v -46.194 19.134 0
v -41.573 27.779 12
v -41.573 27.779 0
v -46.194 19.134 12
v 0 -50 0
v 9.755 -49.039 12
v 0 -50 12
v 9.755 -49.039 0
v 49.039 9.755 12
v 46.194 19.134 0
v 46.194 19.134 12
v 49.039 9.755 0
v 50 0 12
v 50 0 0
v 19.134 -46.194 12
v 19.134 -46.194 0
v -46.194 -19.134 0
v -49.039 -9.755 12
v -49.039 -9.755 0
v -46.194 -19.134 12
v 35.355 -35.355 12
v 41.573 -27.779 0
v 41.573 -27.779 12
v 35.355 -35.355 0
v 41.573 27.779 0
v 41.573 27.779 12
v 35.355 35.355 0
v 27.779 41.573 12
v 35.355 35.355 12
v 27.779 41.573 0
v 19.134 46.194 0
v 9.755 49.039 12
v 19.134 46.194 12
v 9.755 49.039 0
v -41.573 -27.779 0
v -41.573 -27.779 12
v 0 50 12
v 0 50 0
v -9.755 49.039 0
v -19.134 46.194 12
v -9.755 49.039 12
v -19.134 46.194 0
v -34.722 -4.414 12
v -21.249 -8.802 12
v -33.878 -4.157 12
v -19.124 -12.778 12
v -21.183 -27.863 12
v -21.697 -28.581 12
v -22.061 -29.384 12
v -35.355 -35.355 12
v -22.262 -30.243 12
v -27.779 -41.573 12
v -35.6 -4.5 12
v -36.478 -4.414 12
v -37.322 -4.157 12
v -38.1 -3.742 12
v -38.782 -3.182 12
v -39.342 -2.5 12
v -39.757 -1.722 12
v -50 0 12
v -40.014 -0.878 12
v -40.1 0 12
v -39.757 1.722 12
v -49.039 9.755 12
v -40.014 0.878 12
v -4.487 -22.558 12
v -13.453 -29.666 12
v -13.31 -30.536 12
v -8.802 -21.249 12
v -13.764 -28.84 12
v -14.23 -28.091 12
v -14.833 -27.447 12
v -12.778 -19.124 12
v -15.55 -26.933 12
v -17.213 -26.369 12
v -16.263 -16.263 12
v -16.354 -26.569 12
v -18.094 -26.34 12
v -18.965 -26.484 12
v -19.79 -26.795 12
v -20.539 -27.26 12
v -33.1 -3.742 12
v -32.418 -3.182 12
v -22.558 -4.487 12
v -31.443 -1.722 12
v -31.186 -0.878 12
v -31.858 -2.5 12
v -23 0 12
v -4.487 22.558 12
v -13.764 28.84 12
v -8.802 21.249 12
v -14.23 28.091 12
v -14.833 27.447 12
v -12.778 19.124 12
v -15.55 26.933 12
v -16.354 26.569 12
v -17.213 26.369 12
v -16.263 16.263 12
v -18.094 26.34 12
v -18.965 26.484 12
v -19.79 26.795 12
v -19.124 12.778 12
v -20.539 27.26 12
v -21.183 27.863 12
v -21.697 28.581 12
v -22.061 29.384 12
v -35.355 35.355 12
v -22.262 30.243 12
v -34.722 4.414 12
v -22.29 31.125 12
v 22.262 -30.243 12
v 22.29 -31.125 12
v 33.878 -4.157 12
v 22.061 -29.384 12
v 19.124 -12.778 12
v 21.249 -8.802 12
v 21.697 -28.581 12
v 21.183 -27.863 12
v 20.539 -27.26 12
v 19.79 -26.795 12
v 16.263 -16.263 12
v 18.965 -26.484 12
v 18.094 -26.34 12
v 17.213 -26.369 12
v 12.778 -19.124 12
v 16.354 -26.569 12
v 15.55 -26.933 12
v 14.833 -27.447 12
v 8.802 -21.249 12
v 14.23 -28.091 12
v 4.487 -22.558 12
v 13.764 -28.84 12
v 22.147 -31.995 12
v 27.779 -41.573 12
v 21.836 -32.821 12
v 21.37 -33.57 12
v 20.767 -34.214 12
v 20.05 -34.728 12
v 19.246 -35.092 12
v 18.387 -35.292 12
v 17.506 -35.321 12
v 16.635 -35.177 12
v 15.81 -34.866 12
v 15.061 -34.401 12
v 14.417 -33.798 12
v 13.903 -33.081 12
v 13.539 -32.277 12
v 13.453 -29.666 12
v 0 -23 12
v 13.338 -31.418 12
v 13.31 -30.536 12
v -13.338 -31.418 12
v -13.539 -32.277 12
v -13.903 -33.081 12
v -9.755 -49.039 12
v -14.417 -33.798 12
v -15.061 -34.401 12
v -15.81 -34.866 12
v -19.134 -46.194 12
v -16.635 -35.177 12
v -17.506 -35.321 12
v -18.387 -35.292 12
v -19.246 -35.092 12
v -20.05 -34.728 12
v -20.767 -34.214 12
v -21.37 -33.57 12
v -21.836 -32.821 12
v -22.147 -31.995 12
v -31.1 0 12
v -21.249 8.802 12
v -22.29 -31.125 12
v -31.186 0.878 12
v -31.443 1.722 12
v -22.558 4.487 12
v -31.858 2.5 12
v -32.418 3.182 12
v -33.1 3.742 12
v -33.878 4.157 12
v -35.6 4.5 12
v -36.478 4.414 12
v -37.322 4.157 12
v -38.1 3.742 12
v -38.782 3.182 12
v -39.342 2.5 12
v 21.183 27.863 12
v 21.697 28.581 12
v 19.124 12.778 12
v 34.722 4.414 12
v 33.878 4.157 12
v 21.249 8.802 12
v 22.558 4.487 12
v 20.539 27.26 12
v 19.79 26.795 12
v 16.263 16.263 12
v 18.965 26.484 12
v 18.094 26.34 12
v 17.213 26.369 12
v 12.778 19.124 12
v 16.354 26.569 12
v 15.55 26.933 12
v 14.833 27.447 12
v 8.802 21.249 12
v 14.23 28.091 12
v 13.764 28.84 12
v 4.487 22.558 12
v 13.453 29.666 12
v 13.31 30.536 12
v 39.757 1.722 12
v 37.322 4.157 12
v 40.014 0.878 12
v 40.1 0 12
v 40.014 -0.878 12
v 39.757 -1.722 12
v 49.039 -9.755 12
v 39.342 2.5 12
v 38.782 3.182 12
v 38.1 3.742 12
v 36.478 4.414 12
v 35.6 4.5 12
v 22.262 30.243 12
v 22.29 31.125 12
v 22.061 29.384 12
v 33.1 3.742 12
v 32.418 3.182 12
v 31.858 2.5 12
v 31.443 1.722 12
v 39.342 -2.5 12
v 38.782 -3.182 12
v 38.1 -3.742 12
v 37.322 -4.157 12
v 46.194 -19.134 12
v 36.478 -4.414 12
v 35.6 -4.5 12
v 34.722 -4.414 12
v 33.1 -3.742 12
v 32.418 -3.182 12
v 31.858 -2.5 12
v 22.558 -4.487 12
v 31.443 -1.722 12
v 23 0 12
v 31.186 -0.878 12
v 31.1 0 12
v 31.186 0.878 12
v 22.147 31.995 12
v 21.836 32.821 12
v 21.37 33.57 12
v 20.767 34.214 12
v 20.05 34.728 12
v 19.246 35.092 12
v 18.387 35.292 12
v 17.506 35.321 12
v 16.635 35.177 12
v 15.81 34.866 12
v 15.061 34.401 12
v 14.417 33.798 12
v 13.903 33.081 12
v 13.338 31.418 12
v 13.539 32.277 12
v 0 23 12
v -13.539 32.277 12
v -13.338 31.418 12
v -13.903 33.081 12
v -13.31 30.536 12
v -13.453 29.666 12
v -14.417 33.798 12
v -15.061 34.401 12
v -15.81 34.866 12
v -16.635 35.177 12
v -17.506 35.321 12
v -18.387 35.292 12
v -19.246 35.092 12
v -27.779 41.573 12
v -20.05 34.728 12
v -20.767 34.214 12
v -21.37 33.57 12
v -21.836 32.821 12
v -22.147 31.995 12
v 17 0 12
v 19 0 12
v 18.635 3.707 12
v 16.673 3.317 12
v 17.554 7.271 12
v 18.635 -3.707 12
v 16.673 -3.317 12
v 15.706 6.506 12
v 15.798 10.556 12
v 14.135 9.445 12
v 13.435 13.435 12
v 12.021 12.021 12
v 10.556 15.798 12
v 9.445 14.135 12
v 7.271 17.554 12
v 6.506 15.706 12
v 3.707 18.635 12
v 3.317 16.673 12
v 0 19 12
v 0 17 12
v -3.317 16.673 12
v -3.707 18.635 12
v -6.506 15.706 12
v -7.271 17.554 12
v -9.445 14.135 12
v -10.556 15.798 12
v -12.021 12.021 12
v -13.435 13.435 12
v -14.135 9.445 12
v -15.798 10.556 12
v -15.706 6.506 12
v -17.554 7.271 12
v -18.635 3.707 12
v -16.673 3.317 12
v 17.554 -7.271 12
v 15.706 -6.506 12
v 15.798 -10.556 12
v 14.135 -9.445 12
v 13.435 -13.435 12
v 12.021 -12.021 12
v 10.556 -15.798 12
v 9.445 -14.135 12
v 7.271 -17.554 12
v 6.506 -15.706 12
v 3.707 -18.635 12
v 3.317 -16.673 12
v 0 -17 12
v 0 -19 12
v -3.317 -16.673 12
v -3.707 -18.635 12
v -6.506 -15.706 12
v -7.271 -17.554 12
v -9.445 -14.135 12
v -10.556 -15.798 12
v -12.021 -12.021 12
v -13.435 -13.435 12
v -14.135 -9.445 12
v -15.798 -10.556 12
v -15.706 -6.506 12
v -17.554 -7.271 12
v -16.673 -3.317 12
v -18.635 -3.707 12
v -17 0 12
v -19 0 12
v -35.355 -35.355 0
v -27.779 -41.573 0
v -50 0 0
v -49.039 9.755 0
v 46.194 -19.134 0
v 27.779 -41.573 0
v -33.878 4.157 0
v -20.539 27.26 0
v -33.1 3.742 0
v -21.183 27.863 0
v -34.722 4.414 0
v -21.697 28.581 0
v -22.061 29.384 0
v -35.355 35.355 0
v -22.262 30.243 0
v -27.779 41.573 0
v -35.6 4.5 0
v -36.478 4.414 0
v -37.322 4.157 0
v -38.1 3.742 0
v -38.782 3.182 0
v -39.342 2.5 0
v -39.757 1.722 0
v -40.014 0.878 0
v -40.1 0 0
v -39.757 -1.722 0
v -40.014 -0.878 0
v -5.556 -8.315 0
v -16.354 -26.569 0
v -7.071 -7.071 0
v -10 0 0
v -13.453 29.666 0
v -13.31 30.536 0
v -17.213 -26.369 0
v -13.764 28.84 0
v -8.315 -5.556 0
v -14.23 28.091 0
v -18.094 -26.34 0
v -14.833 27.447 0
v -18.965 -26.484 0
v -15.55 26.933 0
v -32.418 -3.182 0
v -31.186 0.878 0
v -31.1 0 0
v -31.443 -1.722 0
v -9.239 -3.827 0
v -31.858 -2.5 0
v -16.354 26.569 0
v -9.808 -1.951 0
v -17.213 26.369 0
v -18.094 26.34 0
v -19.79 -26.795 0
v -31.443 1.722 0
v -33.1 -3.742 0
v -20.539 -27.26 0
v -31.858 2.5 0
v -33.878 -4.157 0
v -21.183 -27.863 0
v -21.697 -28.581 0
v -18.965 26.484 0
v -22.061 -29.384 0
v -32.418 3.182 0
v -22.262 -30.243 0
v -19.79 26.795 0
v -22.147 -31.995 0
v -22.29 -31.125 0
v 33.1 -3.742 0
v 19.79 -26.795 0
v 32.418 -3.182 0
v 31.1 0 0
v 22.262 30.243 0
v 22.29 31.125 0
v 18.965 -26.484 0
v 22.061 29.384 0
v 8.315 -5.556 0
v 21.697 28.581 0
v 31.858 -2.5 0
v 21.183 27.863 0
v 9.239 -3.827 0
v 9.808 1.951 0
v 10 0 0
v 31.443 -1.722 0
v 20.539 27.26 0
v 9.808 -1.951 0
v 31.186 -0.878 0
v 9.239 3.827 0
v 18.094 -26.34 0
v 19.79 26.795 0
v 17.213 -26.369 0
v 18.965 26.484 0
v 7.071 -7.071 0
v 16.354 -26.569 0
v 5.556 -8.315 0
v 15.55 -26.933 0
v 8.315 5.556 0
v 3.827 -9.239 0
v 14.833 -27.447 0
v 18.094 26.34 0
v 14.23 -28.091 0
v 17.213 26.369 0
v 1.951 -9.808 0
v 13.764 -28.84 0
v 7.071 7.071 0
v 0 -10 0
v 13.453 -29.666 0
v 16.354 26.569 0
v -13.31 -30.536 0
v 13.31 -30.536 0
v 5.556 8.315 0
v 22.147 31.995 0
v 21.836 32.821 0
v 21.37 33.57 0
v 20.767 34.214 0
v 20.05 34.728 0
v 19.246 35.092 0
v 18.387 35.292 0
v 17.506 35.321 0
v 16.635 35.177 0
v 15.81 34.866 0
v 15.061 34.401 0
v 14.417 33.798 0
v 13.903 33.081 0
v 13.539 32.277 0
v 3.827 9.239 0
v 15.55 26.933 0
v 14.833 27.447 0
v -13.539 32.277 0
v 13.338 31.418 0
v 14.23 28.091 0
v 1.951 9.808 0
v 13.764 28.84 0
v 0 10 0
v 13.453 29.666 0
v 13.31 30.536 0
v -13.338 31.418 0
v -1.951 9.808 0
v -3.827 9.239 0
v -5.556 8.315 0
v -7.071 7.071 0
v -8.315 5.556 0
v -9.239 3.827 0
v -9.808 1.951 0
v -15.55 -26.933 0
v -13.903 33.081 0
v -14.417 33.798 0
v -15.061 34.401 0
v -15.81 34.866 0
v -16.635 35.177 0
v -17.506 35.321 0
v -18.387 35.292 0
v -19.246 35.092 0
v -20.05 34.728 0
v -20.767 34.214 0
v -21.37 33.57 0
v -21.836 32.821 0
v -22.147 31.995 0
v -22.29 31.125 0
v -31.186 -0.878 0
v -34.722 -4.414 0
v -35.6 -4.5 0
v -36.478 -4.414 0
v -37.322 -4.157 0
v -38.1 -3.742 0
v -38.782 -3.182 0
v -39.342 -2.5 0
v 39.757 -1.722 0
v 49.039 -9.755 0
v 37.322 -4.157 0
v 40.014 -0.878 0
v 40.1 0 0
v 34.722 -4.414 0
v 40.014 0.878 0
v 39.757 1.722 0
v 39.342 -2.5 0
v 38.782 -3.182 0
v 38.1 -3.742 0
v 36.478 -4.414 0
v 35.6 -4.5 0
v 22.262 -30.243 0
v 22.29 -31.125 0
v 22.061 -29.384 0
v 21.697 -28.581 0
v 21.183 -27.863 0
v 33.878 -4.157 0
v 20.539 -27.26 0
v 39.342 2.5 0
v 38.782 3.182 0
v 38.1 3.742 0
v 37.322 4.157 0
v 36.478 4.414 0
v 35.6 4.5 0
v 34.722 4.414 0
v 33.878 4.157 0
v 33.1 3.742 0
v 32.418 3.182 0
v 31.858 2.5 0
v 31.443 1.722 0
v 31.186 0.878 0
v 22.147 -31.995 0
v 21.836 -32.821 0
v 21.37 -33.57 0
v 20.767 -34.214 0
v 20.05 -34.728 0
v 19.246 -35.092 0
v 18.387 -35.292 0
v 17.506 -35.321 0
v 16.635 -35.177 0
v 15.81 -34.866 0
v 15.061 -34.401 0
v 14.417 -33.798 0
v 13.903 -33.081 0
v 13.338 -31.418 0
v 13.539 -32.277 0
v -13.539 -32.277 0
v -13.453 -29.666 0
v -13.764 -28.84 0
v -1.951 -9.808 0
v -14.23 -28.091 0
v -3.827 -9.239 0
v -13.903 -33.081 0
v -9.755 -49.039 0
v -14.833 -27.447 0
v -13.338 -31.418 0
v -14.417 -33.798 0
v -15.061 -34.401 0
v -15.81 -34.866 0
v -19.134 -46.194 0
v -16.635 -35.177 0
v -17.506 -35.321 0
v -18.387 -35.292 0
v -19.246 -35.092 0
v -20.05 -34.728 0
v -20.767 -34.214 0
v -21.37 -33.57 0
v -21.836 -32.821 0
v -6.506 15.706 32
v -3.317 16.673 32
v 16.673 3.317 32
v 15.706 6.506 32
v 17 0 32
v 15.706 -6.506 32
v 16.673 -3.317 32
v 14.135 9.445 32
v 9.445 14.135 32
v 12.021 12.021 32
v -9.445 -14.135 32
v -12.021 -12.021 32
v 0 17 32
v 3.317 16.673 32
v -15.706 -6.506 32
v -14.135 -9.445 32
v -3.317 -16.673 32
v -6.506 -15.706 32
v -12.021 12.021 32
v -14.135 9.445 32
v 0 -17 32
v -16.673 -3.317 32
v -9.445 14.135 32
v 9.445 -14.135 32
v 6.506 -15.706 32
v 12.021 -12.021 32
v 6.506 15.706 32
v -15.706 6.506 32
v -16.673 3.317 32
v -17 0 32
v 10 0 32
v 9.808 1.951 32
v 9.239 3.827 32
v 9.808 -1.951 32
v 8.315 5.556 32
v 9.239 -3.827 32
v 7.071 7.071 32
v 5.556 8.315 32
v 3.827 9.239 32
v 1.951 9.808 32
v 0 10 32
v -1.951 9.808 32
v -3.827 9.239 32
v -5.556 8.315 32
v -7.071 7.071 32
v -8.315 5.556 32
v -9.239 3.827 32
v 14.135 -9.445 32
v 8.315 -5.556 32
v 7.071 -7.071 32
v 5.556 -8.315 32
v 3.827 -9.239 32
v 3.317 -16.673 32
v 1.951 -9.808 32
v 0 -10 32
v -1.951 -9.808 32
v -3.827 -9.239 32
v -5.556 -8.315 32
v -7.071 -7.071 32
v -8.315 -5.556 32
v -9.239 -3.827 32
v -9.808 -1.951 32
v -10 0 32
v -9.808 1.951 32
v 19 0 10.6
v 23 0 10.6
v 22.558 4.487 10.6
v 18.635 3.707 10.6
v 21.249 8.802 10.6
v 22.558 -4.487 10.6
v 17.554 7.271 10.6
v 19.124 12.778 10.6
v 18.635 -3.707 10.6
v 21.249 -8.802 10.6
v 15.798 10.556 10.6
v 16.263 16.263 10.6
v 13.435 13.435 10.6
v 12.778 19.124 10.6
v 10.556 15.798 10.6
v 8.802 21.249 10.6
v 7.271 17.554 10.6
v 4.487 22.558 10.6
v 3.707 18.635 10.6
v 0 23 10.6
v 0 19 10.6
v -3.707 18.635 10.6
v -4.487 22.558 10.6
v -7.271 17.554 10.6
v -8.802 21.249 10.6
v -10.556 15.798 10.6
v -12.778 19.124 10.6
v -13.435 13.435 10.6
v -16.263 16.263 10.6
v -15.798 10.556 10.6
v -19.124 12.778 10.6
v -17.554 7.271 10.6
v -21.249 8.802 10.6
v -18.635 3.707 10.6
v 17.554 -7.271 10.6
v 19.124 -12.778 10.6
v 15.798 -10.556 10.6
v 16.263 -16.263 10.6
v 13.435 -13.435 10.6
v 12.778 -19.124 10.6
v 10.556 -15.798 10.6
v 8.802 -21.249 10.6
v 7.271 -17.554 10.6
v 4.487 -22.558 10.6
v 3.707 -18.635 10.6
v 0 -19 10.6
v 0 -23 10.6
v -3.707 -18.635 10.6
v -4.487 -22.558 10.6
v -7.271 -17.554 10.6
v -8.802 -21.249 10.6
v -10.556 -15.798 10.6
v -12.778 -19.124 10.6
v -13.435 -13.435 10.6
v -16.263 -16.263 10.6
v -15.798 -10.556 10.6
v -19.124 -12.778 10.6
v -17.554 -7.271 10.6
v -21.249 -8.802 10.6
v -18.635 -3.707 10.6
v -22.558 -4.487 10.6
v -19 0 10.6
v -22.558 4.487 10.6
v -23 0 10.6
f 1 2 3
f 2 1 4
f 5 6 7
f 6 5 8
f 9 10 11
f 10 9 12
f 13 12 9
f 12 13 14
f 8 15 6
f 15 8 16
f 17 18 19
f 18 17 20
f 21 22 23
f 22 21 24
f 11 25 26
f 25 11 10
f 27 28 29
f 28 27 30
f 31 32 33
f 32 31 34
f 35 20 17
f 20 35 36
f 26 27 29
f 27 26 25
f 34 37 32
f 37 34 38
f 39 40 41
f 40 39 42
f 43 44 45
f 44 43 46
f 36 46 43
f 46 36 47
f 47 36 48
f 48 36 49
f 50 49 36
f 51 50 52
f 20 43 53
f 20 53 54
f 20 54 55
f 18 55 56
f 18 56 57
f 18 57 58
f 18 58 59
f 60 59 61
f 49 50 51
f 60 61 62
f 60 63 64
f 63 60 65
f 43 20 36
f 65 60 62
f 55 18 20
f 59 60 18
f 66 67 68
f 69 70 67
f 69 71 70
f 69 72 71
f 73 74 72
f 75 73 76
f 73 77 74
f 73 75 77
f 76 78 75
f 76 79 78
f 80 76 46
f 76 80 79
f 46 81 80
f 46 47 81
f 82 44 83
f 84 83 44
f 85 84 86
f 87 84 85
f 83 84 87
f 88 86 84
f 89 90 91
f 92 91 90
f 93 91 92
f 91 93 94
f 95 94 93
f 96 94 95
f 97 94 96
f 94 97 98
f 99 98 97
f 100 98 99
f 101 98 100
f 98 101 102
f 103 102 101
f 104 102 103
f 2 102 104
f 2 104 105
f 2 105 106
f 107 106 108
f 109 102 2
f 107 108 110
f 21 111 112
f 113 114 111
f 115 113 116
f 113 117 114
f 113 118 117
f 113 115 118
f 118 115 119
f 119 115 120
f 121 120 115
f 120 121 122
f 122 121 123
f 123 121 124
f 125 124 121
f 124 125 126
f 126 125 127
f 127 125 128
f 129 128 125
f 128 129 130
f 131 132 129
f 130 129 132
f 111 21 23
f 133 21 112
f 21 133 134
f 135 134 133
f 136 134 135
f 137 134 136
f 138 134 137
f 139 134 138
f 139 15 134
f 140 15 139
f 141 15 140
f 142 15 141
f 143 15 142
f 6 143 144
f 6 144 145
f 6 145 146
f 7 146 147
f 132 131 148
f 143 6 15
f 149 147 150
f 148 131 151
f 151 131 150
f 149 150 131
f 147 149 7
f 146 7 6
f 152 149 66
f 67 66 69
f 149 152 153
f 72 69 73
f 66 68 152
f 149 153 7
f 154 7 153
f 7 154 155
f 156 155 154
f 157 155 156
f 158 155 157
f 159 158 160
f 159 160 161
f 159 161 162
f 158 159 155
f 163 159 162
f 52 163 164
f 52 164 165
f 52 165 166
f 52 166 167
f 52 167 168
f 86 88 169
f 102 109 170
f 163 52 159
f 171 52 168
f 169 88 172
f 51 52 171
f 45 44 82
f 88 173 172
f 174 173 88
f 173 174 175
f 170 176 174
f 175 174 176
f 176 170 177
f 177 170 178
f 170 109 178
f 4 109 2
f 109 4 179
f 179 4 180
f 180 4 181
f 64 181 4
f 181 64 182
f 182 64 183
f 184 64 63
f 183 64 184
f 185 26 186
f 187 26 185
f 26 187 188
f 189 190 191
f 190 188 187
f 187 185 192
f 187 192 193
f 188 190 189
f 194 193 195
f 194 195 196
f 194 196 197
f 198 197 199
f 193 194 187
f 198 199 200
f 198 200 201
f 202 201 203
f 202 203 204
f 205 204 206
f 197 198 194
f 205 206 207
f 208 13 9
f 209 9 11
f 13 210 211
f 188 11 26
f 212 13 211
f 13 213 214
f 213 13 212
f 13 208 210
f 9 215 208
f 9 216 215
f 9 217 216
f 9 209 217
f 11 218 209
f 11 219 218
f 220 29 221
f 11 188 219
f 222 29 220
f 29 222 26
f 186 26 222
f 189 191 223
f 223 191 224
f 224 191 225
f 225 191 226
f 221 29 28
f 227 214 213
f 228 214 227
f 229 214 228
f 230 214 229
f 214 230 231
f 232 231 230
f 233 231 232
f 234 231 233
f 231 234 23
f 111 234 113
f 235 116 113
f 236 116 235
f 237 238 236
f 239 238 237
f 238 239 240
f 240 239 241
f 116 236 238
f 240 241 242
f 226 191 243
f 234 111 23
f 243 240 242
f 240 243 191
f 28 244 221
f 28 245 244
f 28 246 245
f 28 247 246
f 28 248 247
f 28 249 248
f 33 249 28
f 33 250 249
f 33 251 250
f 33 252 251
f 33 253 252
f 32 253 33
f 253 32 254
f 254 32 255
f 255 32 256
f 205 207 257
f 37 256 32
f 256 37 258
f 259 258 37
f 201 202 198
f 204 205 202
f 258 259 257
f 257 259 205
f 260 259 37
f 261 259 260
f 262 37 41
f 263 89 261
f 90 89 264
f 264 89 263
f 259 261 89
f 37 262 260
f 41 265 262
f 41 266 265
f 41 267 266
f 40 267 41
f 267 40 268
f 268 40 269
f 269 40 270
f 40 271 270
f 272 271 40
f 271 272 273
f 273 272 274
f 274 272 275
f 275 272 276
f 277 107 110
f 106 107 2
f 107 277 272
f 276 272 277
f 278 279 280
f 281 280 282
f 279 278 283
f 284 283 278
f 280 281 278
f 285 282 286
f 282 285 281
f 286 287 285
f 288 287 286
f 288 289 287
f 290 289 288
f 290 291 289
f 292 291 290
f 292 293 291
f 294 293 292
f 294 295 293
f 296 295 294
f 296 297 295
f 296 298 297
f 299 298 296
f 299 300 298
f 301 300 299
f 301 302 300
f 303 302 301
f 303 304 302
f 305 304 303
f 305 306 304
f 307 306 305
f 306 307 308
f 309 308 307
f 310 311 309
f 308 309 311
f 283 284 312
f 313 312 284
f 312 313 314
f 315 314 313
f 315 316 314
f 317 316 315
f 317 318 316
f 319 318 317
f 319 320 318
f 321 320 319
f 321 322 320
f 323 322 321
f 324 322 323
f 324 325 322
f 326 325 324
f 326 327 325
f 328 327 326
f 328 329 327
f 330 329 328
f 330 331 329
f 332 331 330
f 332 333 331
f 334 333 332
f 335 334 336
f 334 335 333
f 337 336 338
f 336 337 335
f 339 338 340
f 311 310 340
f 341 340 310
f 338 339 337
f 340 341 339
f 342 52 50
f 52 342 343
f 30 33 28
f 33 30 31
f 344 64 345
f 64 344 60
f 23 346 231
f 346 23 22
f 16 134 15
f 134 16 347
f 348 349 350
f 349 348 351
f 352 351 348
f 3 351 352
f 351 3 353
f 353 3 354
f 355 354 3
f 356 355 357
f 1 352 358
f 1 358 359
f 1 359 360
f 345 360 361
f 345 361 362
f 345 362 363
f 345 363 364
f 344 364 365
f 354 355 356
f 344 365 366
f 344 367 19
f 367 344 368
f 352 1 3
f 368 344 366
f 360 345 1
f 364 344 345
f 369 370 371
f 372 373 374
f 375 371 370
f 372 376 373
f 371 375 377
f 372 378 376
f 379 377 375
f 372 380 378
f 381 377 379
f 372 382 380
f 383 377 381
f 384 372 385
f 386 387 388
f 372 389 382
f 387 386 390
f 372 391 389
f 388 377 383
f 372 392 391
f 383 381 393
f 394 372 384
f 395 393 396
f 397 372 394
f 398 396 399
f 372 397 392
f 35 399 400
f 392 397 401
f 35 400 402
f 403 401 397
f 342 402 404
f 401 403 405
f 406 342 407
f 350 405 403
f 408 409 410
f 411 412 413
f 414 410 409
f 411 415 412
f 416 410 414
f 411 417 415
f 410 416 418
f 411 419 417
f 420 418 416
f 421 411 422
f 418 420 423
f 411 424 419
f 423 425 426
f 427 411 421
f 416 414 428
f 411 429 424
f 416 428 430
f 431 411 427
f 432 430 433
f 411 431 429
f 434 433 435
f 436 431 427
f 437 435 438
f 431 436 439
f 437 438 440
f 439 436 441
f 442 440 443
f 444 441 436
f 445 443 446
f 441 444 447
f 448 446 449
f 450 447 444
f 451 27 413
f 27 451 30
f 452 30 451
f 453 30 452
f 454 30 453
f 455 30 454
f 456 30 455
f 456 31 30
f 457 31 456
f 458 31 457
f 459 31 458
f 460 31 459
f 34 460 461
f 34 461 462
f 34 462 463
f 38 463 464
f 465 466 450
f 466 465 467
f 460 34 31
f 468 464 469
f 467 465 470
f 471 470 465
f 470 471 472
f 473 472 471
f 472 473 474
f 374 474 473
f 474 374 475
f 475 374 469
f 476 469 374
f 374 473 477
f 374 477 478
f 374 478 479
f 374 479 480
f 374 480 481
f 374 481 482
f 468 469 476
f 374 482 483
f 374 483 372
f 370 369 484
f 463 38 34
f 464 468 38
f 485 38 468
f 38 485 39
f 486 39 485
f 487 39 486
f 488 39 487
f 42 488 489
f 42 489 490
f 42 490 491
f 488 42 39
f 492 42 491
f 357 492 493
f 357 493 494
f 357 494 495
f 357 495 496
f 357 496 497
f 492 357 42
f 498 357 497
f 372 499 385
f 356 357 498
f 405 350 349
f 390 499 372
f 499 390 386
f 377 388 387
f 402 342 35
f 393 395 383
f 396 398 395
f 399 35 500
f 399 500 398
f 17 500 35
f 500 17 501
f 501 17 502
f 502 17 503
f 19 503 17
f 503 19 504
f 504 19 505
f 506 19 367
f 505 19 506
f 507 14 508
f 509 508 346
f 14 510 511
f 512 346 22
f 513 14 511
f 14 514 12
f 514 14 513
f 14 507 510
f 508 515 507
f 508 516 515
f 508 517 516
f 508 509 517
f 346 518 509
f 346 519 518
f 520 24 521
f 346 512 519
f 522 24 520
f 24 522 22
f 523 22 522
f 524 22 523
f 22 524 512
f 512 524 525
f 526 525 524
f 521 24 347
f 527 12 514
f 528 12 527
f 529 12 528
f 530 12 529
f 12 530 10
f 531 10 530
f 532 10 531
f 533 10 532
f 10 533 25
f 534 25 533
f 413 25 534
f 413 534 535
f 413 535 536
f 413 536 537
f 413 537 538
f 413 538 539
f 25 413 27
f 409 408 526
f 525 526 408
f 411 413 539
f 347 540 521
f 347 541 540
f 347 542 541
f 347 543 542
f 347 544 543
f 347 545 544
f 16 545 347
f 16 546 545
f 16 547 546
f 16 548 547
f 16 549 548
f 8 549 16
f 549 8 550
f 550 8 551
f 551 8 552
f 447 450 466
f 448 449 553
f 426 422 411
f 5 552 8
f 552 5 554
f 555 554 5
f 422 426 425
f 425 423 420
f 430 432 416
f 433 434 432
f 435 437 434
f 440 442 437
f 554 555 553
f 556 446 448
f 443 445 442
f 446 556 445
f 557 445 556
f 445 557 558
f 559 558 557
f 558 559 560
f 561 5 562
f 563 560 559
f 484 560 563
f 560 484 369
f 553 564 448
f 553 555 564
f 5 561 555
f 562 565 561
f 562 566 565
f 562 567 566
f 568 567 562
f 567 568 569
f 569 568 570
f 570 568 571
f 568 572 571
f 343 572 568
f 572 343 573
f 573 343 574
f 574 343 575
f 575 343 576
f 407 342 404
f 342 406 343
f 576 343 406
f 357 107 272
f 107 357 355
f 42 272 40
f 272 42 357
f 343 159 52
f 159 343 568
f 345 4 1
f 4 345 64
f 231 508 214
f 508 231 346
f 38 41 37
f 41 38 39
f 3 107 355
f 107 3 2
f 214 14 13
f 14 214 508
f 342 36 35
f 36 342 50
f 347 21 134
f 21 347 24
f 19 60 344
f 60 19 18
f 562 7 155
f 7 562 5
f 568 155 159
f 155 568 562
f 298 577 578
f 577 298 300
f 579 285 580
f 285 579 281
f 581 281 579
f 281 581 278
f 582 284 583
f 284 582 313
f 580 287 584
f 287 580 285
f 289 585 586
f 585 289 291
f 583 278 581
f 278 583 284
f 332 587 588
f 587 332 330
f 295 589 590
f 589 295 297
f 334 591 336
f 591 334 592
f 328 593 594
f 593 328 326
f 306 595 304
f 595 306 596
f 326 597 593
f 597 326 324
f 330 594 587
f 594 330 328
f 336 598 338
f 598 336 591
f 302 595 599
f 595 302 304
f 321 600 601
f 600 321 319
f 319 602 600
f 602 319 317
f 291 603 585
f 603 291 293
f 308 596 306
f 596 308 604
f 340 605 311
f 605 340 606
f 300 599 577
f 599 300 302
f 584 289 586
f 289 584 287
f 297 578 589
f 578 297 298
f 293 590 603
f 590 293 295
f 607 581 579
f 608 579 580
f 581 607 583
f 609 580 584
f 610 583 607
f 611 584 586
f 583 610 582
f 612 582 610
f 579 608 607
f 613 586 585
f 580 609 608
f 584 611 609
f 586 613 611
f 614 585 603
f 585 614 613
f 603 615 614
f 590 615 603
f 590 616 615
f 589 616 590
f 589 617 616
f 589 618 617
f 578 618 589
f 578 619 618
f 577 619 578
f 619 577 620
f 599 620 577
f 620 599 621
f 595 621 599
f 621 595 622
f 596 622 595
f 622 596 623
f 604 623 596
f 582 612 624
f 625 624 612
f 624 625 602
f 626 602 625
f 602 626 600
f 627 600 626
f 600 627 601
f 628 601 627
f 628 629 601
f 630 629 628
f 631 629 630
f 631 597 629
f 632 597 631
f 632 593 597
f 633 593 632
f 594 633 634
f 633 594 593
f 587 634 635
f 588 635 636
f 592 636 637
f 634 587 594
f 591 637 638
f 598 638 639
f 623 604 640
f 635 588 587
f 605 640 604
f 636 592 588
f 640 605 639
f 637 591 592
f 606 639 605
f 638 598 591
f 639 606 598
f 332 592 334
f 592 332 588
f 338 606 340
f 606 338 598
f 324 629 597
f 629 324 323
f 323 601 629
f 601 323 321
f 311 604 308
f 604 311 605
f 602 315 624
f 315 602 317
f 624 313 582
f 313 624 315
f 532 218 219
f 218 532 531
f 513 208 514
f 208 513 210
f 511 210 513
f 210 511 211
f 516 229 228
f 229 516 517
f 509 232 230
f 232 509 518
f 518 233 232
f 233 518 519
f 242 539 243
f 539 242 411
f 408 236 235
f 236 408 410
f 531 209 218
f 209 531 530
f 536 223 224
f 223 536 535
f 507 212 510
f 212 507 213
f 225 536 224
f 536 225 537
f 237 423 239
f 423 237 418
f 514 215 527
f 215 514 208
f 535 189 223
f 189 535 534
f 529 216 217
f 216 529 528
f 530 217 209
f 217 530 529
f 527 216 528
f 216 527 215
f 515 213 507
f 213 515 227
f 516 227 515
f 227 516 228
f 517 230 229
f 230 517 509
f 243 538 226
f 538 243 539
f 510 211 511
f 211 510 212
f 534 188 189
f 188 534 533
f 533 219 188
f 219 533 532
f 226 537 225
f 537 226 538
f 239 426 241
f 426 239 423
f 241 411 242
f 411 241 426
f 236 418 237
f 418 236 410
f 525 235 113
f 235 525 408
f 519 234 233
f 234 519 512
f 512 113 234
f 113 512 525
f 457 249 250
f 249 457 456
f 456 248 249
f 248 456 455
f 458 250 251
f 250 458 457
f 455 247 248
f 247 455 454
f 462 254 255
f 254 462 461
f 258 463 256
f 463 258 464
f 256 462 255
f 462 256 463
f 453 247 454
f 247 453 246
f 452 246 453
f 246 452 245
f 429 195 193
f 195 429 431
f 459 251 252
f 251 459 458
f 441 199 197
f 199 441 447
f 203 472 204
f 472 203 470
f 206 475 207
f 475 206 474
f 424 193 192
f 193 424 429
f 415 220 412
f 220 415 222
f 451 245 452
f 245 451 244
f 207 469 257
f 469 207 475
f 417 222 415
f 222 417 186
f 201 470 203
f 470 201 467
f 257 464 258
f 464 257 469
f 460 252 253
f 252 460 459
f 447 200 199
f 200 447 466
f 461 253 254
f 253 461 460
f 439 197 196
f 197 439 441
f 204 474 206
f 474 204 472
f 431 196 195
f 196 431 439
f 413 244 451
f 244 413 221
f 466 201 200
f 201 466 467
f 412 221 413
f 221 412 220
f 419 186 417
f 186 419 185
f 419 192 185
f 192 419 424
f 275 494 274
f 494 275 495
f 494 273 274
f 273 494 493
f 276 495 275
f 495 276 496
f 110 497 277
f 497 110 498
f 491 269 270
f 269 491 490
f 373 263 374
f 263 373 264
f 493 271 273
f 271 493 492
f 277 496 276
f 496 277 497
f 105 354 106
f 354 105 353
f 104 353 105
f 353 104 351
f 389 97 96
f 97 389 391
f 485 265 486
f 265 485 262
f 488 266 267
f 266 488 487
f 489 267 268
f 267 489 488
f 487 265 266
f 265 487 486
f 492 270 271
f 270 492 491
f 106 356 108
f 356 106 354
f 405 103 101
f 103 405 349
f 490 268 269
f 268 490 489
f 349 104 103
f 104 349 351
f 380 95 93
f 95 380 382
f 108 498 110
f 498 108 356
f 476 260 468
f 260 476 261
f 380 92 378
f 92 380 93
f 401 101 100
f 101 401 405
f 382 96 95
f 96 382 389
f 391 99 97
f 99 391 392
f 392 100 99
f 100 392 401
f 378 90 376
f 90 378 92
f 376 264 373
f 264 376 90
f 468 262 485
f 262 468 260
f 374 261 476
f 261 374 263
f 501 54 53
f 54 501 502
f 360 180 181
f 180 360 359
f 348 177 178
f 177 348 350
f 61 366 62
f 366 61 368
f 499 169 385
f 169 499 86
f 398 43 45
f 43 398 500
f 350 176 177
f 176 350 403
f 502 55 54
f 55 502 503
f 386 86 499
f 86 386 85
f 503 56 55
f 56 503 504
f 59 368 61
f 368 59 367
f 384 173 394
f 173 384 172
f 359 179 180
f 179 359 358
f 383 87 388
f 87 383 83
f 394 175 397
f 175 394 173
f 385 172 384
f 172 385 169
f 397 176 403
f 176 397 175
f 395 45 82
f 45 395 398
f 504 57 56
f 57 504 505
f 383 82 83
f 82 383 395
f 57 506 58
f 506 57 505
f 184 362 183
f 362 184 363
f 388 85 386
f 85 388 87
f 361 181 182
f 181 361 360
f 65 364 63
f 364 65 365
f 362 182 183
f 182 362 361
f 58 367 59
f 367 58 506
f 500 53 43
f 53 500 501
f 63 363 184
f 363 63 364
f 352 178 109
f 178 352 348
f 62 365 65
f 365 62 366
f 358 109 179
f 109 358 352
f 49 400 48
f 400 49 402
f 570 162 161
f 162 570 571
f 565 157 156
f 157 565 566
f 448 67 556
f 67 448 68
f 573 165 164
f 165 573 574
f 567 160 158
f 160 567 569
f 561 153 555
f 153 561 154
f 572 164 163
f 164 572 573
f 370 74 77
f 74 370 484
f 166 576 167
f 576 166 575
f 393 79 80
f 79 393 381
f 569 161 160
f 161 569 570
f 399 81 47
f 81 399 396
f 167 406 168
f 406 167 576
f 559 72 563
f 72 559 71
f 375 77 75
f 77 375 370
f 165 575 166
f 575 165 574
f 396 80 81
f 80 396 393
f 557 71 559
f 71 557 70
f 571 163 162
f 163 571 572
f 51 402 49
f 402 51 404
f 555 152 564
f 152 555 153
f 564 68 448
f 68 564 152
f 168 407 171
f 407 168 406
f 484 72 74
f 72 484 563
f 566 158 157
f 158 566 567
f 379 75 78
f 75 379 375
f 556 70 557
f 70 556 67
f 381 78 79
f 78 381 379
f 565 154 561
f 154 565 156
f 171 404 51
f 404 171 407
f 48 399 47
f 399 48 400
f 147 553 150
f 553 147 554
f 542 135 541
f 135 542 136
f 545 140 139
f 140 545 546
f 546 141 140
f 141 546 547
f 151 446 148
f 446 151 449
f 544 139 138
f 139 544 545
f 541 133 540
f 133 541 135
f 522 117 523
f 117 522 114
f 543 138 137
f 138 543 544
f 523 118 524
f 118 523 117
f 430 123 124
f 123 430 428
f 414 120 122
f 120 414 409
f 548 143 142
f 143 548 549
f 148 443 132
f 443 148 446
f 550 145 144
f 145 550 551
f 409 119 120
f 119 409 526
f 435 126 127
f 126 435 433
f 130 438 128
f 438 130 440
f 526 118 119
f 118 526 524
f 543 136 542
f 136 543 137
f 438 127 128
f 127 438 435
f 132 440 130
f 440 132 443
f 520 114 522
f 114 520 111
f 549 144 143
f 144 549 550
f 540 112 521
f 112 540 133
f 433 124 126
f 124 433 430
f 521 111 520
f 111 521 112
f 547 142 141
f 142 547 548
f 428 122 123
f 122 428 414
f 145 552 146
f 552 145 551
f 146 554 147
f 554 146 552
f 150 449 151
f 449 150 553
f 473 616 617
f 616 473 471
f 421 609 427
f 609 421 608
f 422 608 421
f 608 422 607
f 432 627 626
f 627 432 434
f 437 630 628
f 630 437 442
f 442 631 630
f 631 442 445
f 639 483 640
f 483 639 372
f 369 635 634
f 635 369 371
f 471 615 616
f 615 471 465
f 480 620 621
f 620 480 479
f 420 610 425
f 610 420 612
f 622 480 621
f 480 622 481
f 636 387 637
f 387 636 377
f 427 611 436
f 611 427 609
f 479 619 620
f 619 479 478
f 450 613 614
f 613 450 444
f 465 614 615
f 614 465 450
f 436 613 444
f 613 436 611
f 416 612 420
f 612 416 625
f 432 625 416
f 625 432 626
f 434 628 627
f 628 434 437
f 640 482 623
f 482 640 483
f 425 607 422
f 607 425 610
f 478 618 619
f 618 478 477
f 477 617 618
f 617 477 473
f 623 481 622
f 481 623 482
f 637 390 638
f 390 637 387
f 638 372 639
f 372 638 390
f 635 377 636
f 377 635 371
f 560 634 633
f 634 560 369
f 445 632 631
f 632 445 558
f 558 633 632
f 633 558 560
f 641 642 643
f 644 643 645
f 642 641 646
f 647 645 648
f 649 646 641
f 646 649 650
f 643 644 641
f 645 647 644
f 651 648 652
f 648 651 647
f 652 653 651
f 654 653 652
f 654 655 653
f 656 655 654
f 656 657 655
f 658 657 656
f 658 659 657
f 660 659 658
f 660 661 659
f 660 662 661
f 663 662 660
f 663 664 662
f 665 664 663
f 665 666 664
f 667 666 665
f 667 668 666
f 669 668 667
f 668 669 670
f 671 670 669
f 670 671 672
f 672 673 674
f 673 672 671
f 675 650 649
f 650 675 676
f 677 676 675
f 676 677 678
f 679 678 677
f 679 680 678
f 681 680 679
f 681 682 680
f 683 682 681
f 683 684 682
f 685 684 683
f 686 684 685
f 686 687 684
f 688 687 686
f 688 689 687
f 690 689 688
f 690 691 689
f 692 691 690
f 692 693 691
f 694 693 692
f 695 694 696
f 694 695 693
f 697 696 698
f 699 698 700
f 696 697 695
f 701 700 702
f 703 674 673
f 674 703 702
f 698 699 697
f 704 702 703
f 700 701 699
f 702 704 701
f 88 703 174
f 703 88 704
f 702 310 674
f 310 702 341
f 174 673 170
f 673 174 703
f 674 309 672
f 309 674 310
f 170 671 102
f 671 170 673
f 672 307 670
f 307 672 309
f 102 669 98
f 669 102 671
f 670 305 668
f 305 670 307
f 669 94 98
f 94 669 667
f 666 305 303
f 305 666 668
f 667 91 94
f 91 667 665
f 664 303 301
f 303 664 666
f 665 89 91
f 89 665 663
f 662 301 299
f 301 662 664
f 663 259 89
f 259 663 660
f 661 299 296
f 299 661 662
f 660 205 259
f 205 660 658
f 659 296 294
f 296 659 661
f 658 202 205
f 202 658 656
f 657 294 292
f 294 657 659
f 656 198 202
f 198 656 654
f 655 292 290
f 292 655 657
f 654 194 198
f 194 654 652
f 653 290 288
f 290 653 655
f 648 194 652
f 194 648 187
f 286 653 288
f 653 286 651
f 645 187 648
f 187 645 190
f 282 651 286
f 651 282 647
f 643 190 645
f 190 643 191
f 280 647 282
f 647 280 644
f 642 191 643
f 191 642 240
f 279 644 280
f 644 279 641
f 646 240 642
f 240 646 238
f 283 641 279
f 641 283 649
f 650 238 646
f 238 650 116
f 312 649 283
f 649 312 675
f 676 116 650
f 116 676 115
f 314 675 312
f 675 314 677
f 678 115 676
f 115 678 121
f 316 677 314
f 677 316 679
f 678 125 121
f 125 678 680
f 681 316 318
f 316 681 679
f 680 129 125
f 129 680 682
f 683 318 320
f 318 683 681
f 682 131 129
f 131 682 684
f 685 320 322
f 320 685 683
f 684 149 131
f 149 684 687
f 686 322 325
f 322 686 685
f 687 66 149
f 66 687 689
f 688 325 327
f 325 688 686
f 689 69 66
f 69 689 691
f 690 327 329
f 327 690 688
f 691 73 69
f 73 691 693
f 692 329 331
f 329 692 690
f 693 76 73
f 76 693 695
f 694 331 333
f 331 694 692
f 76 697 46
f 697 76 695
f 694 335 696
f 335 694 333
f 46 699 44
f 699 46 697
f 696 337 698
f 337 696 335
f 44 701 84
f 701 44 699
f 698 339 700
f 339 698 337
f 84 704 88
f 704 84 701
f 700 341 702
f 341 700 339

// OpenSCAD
$fn = 32;

// ----------------------------------------------------------------------
// Bolt-circle flange: 100 mm outside, 6 bolt holes, bore 20 mm
// ----------------------------------------------------------------------

// --- parameters (mm) ---
flange_d = 100;           // flange outside diameter
flange_t = 12;            // flange thickness
bolts = 6;                // number of bolt holes
bolt_d = 9;               // bolt clearance
bolt_r = 35.6;            // bolt circle radius
bore_d = 20;              // centre bore
hub_d = 34;               // raised hub diameter
hub_h = 20;               // raised hub height
groove_w = 4;             // gasket groove width
groove_d = 1.4;           // gasket groove depth
groove_r = 19;            // groove radius
groove_z = 10.6;          // groove floor depth from the face

module body() {
  cylinder(h = flange_t, d = flange_d);
  /* raised hub, sunk 1 mm into the flange */
  translate([0, 0, flange_t - 1]) cylinder(h = hub_h + 1, d = hub_d);
}

difference() {
  body();
  /* bolt circle */
  for (i = [0 : bolts - 1]) rotate([0, 0, i * 360 / bolts]) translate([bolt_r, 0, -1]) cylinder(h = flange_t + hub_h + 3, d = bolt_d);
  translate([0, 0, -1]) cylinder(h = flange_t + hub_h + 3, d = bore_d);
  /* gasket groove on the front face */
  rotate_extrude() translate([groove_r, groove_z]) square([groove_w, groove_d + 1]);
}
